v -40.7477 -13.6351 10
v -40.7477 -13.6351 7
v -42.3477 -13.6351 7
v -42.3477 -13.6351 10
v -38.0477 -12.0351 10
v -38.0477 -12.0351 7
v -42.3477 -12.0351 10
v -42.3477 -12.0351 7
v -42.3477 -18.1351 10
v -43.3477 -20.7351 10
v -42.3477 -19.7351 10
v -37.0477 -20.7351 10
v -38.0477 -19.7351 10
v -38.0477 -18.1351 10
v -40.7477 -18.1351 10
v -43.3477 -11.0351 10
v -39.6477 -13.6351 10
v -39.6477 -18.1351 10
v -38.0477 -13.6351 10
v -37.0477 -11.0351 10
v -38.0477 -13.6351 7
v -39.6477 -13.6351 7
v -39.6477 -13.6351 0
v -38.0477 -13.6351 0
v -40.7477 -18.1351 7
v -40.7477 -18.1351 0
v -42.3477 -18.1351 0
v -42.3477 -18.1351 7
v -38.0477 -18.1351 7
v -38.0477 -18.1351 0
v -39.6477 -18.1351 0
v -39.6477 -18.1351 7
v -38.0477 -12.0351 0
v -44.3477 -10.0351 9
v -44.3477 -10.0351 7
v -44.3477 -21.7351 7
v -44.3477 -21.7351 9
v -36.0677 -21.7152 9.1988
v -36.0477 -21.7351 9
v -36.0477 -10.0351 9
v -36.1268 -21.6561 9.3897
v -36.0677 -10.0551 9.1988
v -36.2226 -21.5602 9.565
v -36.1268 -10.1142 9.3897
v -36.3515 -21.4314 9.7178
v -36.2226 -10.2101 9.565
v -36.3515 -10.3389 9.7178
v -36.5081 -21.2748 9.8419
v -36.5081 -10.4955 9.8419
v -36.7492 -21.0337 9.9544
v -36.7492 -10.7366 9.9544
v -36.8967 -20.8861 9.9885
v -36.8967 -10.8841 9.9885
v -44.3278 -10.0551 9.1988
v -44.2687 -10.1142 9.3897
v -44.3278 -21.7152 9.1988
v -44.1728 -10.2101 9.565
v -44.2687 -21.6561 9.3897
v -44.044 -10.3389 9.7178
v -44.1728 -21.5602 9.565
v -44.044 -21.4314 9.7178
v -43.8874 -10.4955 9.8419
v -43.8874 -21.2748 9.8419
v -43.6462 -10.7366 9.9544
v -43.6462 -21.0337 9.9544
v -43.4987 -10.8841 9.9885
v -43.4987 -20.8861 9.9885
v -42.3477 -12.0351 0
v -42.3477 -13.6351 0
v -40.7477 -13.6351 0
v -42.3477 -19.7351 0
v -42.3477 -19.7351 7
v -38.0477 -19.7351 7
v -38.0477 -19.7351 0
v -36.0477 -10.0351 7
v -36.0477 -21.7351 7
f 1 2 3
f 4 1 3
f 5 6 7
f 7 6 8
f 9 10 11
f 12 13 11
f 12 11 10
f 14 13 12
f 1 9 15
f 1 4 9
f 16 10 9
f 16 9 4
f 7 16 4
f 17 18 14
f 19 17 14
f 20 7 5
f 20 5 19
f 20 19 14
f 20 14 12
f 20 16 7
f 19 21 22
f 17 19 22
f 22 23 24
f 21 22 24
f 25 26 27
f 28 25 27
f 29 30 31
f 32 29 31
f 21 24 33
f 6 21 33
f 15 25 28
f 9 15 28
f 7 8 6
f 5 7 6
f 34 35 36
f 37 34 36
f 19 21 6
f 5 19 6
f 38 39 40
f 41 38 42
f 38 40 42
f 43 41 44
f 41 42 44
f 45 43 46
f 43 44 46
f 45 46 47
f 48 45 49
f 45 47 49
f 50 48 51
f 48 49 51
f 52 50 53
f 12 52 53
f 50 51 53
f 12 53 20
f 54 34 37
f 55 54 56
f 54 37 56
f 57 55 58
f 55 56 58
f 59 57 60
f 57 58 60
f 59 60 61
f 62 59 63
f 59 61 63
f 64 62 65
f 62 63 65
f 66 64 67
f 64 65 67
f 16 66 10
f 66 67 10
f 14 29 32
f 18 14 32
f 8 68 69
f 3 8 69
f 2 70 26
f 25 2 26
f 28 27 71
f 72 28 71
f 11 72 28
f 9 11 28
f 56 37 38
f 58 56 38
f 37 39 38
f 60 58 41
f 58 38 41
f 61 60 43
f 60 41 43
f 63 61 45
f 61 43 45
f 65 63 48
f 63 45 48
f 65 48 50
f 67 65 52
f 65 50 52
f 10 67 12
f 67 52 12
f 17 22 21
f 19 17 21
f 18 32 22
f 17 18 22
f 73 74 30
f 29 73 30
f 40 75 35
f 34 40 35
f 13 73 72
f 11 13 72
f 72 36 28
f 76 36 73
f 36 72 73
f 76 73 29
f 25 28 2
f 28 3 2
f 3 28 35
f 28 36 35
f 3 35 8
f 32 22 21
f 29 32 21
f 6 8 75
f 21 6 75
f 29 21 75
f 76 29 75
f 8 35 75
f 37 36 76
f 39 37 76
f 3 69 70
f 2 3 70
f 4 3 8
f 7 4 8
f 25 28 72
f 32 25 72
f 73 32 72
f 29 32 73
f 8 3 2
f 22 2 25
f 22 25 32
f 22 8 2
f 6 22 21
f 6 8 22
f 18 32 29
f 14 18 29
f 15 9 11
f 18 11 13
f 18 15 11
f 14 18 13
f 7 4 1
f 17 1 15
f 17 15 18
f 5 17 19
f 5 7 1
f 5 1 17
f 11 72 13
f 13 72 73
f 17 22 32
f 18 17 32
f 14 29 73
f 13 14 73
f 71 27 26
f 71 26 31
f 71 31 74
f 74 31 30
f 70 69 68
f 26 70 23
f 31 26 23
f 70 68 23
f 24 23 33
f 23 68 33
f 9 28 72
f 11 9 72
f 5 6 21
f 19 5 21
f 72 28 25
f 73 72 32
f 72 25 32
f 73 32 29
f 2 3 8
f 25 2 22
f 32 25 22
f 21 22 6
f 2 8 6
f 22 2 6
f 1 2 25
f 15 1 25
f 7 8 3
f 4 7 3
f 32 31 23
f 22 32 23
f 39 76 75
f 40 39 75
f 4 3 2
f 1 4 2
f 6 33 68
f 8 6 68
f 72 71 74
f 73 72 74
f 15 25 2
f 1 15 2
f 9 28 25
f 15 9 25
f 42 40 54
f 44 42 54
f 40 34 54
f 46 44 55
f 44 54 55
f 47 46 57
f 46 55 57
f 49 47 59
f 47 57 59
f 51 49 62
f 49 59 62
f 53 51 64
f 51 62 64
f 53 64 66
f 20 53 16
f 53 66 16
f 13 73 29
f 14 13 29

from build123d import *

# Parameters (mm, degrees)
F1_DEPTH = 7
F3_DEPTH = 3
F4_DEPTH = 3
F5_R     = 1


with BuildPart() as f1:
    # F0 (on Top) → F1 (new body)
    with BuildSketch(Plane.XY):
        Polygon((-42.347722, -13.635143), (-40.747722, -13.635143), (-40.747722, -18.135143), (-42.347722, -18.135143), (-42.347722, -19.735143), (-38.047722, -19.735143), (-38.047722, -18.135143), (-39.647722, -18.135143), (-39.647722, -13.635143), (-38.047722, -13.635143), (-38.047722, -12.035143), (-42.347722, -12.035143), align=None)
    extrude(amount=F1_DEPTH)


with BuildPart() as f3:
    # F2 (on face) → F3 (new body)
    with BuildSketch(Plane.XY.offset(7)):
        Polygon((-44.347722, -10.035143), (-44.347722, -18.635144), (-44.347722, -21.735143), (-36.047722, -21.735143), (-36.047722, -13.135143), (-36.047722, -10.035143), align=None)
        Polygon((-40.747722, -13.635143), (-42.347722, -13.635143), (-42.347722, -12.035143), (-38.047722, -12.035143), (-38.047722, -13.635143), (-39.647722, -13.635143), (-39.647722, -18.135143), (-38.047722, -18.135143), (-38.047722, -19.735143), (-42.347722, -19.735143), (-42.347722, -18.135143), (-40.747722, -18.135143), align=None, mode=Mode.SUBTRACT)
    extrude(amount=F3_DEPTH)

    # F5
    f5_edges = [f3.edges().sort_by_distance(p)[0] for p in [
        (-40.197722, -10.035143, 10),
        (-44.347722, -15.885143, 10),
        (-40.197722, -21.735143, 10),
        (-36.047722, -15.885143, 10),
    ]]
    fillet(f5_edges, radius=F5_R)


with BuildPart() as f4:
    # F1_face (on face) → F4 (new body)
    with BuildSketch(Plane(origin=(-40.197722, -15.885143, 7), x_dir=(1, 0, 0), z_dir=(0, 0, 1))):
        Polygon((-2.15, 2.25), (-0.55, 2.25), (-0.55, -2.25), (-2.15, -2.25), (-2.15, -3.85), (2.15, -3.85), (2.15, -2.25), (0.55, -2.25), (0.55, 2.25), (2.15, 2.25), (2.15, 3.85), (-2.15, 3.85), align=None)
    extrude(amount=F4_DEPTH)


solid = Compound([f1.part, f3.part, f4.part])
